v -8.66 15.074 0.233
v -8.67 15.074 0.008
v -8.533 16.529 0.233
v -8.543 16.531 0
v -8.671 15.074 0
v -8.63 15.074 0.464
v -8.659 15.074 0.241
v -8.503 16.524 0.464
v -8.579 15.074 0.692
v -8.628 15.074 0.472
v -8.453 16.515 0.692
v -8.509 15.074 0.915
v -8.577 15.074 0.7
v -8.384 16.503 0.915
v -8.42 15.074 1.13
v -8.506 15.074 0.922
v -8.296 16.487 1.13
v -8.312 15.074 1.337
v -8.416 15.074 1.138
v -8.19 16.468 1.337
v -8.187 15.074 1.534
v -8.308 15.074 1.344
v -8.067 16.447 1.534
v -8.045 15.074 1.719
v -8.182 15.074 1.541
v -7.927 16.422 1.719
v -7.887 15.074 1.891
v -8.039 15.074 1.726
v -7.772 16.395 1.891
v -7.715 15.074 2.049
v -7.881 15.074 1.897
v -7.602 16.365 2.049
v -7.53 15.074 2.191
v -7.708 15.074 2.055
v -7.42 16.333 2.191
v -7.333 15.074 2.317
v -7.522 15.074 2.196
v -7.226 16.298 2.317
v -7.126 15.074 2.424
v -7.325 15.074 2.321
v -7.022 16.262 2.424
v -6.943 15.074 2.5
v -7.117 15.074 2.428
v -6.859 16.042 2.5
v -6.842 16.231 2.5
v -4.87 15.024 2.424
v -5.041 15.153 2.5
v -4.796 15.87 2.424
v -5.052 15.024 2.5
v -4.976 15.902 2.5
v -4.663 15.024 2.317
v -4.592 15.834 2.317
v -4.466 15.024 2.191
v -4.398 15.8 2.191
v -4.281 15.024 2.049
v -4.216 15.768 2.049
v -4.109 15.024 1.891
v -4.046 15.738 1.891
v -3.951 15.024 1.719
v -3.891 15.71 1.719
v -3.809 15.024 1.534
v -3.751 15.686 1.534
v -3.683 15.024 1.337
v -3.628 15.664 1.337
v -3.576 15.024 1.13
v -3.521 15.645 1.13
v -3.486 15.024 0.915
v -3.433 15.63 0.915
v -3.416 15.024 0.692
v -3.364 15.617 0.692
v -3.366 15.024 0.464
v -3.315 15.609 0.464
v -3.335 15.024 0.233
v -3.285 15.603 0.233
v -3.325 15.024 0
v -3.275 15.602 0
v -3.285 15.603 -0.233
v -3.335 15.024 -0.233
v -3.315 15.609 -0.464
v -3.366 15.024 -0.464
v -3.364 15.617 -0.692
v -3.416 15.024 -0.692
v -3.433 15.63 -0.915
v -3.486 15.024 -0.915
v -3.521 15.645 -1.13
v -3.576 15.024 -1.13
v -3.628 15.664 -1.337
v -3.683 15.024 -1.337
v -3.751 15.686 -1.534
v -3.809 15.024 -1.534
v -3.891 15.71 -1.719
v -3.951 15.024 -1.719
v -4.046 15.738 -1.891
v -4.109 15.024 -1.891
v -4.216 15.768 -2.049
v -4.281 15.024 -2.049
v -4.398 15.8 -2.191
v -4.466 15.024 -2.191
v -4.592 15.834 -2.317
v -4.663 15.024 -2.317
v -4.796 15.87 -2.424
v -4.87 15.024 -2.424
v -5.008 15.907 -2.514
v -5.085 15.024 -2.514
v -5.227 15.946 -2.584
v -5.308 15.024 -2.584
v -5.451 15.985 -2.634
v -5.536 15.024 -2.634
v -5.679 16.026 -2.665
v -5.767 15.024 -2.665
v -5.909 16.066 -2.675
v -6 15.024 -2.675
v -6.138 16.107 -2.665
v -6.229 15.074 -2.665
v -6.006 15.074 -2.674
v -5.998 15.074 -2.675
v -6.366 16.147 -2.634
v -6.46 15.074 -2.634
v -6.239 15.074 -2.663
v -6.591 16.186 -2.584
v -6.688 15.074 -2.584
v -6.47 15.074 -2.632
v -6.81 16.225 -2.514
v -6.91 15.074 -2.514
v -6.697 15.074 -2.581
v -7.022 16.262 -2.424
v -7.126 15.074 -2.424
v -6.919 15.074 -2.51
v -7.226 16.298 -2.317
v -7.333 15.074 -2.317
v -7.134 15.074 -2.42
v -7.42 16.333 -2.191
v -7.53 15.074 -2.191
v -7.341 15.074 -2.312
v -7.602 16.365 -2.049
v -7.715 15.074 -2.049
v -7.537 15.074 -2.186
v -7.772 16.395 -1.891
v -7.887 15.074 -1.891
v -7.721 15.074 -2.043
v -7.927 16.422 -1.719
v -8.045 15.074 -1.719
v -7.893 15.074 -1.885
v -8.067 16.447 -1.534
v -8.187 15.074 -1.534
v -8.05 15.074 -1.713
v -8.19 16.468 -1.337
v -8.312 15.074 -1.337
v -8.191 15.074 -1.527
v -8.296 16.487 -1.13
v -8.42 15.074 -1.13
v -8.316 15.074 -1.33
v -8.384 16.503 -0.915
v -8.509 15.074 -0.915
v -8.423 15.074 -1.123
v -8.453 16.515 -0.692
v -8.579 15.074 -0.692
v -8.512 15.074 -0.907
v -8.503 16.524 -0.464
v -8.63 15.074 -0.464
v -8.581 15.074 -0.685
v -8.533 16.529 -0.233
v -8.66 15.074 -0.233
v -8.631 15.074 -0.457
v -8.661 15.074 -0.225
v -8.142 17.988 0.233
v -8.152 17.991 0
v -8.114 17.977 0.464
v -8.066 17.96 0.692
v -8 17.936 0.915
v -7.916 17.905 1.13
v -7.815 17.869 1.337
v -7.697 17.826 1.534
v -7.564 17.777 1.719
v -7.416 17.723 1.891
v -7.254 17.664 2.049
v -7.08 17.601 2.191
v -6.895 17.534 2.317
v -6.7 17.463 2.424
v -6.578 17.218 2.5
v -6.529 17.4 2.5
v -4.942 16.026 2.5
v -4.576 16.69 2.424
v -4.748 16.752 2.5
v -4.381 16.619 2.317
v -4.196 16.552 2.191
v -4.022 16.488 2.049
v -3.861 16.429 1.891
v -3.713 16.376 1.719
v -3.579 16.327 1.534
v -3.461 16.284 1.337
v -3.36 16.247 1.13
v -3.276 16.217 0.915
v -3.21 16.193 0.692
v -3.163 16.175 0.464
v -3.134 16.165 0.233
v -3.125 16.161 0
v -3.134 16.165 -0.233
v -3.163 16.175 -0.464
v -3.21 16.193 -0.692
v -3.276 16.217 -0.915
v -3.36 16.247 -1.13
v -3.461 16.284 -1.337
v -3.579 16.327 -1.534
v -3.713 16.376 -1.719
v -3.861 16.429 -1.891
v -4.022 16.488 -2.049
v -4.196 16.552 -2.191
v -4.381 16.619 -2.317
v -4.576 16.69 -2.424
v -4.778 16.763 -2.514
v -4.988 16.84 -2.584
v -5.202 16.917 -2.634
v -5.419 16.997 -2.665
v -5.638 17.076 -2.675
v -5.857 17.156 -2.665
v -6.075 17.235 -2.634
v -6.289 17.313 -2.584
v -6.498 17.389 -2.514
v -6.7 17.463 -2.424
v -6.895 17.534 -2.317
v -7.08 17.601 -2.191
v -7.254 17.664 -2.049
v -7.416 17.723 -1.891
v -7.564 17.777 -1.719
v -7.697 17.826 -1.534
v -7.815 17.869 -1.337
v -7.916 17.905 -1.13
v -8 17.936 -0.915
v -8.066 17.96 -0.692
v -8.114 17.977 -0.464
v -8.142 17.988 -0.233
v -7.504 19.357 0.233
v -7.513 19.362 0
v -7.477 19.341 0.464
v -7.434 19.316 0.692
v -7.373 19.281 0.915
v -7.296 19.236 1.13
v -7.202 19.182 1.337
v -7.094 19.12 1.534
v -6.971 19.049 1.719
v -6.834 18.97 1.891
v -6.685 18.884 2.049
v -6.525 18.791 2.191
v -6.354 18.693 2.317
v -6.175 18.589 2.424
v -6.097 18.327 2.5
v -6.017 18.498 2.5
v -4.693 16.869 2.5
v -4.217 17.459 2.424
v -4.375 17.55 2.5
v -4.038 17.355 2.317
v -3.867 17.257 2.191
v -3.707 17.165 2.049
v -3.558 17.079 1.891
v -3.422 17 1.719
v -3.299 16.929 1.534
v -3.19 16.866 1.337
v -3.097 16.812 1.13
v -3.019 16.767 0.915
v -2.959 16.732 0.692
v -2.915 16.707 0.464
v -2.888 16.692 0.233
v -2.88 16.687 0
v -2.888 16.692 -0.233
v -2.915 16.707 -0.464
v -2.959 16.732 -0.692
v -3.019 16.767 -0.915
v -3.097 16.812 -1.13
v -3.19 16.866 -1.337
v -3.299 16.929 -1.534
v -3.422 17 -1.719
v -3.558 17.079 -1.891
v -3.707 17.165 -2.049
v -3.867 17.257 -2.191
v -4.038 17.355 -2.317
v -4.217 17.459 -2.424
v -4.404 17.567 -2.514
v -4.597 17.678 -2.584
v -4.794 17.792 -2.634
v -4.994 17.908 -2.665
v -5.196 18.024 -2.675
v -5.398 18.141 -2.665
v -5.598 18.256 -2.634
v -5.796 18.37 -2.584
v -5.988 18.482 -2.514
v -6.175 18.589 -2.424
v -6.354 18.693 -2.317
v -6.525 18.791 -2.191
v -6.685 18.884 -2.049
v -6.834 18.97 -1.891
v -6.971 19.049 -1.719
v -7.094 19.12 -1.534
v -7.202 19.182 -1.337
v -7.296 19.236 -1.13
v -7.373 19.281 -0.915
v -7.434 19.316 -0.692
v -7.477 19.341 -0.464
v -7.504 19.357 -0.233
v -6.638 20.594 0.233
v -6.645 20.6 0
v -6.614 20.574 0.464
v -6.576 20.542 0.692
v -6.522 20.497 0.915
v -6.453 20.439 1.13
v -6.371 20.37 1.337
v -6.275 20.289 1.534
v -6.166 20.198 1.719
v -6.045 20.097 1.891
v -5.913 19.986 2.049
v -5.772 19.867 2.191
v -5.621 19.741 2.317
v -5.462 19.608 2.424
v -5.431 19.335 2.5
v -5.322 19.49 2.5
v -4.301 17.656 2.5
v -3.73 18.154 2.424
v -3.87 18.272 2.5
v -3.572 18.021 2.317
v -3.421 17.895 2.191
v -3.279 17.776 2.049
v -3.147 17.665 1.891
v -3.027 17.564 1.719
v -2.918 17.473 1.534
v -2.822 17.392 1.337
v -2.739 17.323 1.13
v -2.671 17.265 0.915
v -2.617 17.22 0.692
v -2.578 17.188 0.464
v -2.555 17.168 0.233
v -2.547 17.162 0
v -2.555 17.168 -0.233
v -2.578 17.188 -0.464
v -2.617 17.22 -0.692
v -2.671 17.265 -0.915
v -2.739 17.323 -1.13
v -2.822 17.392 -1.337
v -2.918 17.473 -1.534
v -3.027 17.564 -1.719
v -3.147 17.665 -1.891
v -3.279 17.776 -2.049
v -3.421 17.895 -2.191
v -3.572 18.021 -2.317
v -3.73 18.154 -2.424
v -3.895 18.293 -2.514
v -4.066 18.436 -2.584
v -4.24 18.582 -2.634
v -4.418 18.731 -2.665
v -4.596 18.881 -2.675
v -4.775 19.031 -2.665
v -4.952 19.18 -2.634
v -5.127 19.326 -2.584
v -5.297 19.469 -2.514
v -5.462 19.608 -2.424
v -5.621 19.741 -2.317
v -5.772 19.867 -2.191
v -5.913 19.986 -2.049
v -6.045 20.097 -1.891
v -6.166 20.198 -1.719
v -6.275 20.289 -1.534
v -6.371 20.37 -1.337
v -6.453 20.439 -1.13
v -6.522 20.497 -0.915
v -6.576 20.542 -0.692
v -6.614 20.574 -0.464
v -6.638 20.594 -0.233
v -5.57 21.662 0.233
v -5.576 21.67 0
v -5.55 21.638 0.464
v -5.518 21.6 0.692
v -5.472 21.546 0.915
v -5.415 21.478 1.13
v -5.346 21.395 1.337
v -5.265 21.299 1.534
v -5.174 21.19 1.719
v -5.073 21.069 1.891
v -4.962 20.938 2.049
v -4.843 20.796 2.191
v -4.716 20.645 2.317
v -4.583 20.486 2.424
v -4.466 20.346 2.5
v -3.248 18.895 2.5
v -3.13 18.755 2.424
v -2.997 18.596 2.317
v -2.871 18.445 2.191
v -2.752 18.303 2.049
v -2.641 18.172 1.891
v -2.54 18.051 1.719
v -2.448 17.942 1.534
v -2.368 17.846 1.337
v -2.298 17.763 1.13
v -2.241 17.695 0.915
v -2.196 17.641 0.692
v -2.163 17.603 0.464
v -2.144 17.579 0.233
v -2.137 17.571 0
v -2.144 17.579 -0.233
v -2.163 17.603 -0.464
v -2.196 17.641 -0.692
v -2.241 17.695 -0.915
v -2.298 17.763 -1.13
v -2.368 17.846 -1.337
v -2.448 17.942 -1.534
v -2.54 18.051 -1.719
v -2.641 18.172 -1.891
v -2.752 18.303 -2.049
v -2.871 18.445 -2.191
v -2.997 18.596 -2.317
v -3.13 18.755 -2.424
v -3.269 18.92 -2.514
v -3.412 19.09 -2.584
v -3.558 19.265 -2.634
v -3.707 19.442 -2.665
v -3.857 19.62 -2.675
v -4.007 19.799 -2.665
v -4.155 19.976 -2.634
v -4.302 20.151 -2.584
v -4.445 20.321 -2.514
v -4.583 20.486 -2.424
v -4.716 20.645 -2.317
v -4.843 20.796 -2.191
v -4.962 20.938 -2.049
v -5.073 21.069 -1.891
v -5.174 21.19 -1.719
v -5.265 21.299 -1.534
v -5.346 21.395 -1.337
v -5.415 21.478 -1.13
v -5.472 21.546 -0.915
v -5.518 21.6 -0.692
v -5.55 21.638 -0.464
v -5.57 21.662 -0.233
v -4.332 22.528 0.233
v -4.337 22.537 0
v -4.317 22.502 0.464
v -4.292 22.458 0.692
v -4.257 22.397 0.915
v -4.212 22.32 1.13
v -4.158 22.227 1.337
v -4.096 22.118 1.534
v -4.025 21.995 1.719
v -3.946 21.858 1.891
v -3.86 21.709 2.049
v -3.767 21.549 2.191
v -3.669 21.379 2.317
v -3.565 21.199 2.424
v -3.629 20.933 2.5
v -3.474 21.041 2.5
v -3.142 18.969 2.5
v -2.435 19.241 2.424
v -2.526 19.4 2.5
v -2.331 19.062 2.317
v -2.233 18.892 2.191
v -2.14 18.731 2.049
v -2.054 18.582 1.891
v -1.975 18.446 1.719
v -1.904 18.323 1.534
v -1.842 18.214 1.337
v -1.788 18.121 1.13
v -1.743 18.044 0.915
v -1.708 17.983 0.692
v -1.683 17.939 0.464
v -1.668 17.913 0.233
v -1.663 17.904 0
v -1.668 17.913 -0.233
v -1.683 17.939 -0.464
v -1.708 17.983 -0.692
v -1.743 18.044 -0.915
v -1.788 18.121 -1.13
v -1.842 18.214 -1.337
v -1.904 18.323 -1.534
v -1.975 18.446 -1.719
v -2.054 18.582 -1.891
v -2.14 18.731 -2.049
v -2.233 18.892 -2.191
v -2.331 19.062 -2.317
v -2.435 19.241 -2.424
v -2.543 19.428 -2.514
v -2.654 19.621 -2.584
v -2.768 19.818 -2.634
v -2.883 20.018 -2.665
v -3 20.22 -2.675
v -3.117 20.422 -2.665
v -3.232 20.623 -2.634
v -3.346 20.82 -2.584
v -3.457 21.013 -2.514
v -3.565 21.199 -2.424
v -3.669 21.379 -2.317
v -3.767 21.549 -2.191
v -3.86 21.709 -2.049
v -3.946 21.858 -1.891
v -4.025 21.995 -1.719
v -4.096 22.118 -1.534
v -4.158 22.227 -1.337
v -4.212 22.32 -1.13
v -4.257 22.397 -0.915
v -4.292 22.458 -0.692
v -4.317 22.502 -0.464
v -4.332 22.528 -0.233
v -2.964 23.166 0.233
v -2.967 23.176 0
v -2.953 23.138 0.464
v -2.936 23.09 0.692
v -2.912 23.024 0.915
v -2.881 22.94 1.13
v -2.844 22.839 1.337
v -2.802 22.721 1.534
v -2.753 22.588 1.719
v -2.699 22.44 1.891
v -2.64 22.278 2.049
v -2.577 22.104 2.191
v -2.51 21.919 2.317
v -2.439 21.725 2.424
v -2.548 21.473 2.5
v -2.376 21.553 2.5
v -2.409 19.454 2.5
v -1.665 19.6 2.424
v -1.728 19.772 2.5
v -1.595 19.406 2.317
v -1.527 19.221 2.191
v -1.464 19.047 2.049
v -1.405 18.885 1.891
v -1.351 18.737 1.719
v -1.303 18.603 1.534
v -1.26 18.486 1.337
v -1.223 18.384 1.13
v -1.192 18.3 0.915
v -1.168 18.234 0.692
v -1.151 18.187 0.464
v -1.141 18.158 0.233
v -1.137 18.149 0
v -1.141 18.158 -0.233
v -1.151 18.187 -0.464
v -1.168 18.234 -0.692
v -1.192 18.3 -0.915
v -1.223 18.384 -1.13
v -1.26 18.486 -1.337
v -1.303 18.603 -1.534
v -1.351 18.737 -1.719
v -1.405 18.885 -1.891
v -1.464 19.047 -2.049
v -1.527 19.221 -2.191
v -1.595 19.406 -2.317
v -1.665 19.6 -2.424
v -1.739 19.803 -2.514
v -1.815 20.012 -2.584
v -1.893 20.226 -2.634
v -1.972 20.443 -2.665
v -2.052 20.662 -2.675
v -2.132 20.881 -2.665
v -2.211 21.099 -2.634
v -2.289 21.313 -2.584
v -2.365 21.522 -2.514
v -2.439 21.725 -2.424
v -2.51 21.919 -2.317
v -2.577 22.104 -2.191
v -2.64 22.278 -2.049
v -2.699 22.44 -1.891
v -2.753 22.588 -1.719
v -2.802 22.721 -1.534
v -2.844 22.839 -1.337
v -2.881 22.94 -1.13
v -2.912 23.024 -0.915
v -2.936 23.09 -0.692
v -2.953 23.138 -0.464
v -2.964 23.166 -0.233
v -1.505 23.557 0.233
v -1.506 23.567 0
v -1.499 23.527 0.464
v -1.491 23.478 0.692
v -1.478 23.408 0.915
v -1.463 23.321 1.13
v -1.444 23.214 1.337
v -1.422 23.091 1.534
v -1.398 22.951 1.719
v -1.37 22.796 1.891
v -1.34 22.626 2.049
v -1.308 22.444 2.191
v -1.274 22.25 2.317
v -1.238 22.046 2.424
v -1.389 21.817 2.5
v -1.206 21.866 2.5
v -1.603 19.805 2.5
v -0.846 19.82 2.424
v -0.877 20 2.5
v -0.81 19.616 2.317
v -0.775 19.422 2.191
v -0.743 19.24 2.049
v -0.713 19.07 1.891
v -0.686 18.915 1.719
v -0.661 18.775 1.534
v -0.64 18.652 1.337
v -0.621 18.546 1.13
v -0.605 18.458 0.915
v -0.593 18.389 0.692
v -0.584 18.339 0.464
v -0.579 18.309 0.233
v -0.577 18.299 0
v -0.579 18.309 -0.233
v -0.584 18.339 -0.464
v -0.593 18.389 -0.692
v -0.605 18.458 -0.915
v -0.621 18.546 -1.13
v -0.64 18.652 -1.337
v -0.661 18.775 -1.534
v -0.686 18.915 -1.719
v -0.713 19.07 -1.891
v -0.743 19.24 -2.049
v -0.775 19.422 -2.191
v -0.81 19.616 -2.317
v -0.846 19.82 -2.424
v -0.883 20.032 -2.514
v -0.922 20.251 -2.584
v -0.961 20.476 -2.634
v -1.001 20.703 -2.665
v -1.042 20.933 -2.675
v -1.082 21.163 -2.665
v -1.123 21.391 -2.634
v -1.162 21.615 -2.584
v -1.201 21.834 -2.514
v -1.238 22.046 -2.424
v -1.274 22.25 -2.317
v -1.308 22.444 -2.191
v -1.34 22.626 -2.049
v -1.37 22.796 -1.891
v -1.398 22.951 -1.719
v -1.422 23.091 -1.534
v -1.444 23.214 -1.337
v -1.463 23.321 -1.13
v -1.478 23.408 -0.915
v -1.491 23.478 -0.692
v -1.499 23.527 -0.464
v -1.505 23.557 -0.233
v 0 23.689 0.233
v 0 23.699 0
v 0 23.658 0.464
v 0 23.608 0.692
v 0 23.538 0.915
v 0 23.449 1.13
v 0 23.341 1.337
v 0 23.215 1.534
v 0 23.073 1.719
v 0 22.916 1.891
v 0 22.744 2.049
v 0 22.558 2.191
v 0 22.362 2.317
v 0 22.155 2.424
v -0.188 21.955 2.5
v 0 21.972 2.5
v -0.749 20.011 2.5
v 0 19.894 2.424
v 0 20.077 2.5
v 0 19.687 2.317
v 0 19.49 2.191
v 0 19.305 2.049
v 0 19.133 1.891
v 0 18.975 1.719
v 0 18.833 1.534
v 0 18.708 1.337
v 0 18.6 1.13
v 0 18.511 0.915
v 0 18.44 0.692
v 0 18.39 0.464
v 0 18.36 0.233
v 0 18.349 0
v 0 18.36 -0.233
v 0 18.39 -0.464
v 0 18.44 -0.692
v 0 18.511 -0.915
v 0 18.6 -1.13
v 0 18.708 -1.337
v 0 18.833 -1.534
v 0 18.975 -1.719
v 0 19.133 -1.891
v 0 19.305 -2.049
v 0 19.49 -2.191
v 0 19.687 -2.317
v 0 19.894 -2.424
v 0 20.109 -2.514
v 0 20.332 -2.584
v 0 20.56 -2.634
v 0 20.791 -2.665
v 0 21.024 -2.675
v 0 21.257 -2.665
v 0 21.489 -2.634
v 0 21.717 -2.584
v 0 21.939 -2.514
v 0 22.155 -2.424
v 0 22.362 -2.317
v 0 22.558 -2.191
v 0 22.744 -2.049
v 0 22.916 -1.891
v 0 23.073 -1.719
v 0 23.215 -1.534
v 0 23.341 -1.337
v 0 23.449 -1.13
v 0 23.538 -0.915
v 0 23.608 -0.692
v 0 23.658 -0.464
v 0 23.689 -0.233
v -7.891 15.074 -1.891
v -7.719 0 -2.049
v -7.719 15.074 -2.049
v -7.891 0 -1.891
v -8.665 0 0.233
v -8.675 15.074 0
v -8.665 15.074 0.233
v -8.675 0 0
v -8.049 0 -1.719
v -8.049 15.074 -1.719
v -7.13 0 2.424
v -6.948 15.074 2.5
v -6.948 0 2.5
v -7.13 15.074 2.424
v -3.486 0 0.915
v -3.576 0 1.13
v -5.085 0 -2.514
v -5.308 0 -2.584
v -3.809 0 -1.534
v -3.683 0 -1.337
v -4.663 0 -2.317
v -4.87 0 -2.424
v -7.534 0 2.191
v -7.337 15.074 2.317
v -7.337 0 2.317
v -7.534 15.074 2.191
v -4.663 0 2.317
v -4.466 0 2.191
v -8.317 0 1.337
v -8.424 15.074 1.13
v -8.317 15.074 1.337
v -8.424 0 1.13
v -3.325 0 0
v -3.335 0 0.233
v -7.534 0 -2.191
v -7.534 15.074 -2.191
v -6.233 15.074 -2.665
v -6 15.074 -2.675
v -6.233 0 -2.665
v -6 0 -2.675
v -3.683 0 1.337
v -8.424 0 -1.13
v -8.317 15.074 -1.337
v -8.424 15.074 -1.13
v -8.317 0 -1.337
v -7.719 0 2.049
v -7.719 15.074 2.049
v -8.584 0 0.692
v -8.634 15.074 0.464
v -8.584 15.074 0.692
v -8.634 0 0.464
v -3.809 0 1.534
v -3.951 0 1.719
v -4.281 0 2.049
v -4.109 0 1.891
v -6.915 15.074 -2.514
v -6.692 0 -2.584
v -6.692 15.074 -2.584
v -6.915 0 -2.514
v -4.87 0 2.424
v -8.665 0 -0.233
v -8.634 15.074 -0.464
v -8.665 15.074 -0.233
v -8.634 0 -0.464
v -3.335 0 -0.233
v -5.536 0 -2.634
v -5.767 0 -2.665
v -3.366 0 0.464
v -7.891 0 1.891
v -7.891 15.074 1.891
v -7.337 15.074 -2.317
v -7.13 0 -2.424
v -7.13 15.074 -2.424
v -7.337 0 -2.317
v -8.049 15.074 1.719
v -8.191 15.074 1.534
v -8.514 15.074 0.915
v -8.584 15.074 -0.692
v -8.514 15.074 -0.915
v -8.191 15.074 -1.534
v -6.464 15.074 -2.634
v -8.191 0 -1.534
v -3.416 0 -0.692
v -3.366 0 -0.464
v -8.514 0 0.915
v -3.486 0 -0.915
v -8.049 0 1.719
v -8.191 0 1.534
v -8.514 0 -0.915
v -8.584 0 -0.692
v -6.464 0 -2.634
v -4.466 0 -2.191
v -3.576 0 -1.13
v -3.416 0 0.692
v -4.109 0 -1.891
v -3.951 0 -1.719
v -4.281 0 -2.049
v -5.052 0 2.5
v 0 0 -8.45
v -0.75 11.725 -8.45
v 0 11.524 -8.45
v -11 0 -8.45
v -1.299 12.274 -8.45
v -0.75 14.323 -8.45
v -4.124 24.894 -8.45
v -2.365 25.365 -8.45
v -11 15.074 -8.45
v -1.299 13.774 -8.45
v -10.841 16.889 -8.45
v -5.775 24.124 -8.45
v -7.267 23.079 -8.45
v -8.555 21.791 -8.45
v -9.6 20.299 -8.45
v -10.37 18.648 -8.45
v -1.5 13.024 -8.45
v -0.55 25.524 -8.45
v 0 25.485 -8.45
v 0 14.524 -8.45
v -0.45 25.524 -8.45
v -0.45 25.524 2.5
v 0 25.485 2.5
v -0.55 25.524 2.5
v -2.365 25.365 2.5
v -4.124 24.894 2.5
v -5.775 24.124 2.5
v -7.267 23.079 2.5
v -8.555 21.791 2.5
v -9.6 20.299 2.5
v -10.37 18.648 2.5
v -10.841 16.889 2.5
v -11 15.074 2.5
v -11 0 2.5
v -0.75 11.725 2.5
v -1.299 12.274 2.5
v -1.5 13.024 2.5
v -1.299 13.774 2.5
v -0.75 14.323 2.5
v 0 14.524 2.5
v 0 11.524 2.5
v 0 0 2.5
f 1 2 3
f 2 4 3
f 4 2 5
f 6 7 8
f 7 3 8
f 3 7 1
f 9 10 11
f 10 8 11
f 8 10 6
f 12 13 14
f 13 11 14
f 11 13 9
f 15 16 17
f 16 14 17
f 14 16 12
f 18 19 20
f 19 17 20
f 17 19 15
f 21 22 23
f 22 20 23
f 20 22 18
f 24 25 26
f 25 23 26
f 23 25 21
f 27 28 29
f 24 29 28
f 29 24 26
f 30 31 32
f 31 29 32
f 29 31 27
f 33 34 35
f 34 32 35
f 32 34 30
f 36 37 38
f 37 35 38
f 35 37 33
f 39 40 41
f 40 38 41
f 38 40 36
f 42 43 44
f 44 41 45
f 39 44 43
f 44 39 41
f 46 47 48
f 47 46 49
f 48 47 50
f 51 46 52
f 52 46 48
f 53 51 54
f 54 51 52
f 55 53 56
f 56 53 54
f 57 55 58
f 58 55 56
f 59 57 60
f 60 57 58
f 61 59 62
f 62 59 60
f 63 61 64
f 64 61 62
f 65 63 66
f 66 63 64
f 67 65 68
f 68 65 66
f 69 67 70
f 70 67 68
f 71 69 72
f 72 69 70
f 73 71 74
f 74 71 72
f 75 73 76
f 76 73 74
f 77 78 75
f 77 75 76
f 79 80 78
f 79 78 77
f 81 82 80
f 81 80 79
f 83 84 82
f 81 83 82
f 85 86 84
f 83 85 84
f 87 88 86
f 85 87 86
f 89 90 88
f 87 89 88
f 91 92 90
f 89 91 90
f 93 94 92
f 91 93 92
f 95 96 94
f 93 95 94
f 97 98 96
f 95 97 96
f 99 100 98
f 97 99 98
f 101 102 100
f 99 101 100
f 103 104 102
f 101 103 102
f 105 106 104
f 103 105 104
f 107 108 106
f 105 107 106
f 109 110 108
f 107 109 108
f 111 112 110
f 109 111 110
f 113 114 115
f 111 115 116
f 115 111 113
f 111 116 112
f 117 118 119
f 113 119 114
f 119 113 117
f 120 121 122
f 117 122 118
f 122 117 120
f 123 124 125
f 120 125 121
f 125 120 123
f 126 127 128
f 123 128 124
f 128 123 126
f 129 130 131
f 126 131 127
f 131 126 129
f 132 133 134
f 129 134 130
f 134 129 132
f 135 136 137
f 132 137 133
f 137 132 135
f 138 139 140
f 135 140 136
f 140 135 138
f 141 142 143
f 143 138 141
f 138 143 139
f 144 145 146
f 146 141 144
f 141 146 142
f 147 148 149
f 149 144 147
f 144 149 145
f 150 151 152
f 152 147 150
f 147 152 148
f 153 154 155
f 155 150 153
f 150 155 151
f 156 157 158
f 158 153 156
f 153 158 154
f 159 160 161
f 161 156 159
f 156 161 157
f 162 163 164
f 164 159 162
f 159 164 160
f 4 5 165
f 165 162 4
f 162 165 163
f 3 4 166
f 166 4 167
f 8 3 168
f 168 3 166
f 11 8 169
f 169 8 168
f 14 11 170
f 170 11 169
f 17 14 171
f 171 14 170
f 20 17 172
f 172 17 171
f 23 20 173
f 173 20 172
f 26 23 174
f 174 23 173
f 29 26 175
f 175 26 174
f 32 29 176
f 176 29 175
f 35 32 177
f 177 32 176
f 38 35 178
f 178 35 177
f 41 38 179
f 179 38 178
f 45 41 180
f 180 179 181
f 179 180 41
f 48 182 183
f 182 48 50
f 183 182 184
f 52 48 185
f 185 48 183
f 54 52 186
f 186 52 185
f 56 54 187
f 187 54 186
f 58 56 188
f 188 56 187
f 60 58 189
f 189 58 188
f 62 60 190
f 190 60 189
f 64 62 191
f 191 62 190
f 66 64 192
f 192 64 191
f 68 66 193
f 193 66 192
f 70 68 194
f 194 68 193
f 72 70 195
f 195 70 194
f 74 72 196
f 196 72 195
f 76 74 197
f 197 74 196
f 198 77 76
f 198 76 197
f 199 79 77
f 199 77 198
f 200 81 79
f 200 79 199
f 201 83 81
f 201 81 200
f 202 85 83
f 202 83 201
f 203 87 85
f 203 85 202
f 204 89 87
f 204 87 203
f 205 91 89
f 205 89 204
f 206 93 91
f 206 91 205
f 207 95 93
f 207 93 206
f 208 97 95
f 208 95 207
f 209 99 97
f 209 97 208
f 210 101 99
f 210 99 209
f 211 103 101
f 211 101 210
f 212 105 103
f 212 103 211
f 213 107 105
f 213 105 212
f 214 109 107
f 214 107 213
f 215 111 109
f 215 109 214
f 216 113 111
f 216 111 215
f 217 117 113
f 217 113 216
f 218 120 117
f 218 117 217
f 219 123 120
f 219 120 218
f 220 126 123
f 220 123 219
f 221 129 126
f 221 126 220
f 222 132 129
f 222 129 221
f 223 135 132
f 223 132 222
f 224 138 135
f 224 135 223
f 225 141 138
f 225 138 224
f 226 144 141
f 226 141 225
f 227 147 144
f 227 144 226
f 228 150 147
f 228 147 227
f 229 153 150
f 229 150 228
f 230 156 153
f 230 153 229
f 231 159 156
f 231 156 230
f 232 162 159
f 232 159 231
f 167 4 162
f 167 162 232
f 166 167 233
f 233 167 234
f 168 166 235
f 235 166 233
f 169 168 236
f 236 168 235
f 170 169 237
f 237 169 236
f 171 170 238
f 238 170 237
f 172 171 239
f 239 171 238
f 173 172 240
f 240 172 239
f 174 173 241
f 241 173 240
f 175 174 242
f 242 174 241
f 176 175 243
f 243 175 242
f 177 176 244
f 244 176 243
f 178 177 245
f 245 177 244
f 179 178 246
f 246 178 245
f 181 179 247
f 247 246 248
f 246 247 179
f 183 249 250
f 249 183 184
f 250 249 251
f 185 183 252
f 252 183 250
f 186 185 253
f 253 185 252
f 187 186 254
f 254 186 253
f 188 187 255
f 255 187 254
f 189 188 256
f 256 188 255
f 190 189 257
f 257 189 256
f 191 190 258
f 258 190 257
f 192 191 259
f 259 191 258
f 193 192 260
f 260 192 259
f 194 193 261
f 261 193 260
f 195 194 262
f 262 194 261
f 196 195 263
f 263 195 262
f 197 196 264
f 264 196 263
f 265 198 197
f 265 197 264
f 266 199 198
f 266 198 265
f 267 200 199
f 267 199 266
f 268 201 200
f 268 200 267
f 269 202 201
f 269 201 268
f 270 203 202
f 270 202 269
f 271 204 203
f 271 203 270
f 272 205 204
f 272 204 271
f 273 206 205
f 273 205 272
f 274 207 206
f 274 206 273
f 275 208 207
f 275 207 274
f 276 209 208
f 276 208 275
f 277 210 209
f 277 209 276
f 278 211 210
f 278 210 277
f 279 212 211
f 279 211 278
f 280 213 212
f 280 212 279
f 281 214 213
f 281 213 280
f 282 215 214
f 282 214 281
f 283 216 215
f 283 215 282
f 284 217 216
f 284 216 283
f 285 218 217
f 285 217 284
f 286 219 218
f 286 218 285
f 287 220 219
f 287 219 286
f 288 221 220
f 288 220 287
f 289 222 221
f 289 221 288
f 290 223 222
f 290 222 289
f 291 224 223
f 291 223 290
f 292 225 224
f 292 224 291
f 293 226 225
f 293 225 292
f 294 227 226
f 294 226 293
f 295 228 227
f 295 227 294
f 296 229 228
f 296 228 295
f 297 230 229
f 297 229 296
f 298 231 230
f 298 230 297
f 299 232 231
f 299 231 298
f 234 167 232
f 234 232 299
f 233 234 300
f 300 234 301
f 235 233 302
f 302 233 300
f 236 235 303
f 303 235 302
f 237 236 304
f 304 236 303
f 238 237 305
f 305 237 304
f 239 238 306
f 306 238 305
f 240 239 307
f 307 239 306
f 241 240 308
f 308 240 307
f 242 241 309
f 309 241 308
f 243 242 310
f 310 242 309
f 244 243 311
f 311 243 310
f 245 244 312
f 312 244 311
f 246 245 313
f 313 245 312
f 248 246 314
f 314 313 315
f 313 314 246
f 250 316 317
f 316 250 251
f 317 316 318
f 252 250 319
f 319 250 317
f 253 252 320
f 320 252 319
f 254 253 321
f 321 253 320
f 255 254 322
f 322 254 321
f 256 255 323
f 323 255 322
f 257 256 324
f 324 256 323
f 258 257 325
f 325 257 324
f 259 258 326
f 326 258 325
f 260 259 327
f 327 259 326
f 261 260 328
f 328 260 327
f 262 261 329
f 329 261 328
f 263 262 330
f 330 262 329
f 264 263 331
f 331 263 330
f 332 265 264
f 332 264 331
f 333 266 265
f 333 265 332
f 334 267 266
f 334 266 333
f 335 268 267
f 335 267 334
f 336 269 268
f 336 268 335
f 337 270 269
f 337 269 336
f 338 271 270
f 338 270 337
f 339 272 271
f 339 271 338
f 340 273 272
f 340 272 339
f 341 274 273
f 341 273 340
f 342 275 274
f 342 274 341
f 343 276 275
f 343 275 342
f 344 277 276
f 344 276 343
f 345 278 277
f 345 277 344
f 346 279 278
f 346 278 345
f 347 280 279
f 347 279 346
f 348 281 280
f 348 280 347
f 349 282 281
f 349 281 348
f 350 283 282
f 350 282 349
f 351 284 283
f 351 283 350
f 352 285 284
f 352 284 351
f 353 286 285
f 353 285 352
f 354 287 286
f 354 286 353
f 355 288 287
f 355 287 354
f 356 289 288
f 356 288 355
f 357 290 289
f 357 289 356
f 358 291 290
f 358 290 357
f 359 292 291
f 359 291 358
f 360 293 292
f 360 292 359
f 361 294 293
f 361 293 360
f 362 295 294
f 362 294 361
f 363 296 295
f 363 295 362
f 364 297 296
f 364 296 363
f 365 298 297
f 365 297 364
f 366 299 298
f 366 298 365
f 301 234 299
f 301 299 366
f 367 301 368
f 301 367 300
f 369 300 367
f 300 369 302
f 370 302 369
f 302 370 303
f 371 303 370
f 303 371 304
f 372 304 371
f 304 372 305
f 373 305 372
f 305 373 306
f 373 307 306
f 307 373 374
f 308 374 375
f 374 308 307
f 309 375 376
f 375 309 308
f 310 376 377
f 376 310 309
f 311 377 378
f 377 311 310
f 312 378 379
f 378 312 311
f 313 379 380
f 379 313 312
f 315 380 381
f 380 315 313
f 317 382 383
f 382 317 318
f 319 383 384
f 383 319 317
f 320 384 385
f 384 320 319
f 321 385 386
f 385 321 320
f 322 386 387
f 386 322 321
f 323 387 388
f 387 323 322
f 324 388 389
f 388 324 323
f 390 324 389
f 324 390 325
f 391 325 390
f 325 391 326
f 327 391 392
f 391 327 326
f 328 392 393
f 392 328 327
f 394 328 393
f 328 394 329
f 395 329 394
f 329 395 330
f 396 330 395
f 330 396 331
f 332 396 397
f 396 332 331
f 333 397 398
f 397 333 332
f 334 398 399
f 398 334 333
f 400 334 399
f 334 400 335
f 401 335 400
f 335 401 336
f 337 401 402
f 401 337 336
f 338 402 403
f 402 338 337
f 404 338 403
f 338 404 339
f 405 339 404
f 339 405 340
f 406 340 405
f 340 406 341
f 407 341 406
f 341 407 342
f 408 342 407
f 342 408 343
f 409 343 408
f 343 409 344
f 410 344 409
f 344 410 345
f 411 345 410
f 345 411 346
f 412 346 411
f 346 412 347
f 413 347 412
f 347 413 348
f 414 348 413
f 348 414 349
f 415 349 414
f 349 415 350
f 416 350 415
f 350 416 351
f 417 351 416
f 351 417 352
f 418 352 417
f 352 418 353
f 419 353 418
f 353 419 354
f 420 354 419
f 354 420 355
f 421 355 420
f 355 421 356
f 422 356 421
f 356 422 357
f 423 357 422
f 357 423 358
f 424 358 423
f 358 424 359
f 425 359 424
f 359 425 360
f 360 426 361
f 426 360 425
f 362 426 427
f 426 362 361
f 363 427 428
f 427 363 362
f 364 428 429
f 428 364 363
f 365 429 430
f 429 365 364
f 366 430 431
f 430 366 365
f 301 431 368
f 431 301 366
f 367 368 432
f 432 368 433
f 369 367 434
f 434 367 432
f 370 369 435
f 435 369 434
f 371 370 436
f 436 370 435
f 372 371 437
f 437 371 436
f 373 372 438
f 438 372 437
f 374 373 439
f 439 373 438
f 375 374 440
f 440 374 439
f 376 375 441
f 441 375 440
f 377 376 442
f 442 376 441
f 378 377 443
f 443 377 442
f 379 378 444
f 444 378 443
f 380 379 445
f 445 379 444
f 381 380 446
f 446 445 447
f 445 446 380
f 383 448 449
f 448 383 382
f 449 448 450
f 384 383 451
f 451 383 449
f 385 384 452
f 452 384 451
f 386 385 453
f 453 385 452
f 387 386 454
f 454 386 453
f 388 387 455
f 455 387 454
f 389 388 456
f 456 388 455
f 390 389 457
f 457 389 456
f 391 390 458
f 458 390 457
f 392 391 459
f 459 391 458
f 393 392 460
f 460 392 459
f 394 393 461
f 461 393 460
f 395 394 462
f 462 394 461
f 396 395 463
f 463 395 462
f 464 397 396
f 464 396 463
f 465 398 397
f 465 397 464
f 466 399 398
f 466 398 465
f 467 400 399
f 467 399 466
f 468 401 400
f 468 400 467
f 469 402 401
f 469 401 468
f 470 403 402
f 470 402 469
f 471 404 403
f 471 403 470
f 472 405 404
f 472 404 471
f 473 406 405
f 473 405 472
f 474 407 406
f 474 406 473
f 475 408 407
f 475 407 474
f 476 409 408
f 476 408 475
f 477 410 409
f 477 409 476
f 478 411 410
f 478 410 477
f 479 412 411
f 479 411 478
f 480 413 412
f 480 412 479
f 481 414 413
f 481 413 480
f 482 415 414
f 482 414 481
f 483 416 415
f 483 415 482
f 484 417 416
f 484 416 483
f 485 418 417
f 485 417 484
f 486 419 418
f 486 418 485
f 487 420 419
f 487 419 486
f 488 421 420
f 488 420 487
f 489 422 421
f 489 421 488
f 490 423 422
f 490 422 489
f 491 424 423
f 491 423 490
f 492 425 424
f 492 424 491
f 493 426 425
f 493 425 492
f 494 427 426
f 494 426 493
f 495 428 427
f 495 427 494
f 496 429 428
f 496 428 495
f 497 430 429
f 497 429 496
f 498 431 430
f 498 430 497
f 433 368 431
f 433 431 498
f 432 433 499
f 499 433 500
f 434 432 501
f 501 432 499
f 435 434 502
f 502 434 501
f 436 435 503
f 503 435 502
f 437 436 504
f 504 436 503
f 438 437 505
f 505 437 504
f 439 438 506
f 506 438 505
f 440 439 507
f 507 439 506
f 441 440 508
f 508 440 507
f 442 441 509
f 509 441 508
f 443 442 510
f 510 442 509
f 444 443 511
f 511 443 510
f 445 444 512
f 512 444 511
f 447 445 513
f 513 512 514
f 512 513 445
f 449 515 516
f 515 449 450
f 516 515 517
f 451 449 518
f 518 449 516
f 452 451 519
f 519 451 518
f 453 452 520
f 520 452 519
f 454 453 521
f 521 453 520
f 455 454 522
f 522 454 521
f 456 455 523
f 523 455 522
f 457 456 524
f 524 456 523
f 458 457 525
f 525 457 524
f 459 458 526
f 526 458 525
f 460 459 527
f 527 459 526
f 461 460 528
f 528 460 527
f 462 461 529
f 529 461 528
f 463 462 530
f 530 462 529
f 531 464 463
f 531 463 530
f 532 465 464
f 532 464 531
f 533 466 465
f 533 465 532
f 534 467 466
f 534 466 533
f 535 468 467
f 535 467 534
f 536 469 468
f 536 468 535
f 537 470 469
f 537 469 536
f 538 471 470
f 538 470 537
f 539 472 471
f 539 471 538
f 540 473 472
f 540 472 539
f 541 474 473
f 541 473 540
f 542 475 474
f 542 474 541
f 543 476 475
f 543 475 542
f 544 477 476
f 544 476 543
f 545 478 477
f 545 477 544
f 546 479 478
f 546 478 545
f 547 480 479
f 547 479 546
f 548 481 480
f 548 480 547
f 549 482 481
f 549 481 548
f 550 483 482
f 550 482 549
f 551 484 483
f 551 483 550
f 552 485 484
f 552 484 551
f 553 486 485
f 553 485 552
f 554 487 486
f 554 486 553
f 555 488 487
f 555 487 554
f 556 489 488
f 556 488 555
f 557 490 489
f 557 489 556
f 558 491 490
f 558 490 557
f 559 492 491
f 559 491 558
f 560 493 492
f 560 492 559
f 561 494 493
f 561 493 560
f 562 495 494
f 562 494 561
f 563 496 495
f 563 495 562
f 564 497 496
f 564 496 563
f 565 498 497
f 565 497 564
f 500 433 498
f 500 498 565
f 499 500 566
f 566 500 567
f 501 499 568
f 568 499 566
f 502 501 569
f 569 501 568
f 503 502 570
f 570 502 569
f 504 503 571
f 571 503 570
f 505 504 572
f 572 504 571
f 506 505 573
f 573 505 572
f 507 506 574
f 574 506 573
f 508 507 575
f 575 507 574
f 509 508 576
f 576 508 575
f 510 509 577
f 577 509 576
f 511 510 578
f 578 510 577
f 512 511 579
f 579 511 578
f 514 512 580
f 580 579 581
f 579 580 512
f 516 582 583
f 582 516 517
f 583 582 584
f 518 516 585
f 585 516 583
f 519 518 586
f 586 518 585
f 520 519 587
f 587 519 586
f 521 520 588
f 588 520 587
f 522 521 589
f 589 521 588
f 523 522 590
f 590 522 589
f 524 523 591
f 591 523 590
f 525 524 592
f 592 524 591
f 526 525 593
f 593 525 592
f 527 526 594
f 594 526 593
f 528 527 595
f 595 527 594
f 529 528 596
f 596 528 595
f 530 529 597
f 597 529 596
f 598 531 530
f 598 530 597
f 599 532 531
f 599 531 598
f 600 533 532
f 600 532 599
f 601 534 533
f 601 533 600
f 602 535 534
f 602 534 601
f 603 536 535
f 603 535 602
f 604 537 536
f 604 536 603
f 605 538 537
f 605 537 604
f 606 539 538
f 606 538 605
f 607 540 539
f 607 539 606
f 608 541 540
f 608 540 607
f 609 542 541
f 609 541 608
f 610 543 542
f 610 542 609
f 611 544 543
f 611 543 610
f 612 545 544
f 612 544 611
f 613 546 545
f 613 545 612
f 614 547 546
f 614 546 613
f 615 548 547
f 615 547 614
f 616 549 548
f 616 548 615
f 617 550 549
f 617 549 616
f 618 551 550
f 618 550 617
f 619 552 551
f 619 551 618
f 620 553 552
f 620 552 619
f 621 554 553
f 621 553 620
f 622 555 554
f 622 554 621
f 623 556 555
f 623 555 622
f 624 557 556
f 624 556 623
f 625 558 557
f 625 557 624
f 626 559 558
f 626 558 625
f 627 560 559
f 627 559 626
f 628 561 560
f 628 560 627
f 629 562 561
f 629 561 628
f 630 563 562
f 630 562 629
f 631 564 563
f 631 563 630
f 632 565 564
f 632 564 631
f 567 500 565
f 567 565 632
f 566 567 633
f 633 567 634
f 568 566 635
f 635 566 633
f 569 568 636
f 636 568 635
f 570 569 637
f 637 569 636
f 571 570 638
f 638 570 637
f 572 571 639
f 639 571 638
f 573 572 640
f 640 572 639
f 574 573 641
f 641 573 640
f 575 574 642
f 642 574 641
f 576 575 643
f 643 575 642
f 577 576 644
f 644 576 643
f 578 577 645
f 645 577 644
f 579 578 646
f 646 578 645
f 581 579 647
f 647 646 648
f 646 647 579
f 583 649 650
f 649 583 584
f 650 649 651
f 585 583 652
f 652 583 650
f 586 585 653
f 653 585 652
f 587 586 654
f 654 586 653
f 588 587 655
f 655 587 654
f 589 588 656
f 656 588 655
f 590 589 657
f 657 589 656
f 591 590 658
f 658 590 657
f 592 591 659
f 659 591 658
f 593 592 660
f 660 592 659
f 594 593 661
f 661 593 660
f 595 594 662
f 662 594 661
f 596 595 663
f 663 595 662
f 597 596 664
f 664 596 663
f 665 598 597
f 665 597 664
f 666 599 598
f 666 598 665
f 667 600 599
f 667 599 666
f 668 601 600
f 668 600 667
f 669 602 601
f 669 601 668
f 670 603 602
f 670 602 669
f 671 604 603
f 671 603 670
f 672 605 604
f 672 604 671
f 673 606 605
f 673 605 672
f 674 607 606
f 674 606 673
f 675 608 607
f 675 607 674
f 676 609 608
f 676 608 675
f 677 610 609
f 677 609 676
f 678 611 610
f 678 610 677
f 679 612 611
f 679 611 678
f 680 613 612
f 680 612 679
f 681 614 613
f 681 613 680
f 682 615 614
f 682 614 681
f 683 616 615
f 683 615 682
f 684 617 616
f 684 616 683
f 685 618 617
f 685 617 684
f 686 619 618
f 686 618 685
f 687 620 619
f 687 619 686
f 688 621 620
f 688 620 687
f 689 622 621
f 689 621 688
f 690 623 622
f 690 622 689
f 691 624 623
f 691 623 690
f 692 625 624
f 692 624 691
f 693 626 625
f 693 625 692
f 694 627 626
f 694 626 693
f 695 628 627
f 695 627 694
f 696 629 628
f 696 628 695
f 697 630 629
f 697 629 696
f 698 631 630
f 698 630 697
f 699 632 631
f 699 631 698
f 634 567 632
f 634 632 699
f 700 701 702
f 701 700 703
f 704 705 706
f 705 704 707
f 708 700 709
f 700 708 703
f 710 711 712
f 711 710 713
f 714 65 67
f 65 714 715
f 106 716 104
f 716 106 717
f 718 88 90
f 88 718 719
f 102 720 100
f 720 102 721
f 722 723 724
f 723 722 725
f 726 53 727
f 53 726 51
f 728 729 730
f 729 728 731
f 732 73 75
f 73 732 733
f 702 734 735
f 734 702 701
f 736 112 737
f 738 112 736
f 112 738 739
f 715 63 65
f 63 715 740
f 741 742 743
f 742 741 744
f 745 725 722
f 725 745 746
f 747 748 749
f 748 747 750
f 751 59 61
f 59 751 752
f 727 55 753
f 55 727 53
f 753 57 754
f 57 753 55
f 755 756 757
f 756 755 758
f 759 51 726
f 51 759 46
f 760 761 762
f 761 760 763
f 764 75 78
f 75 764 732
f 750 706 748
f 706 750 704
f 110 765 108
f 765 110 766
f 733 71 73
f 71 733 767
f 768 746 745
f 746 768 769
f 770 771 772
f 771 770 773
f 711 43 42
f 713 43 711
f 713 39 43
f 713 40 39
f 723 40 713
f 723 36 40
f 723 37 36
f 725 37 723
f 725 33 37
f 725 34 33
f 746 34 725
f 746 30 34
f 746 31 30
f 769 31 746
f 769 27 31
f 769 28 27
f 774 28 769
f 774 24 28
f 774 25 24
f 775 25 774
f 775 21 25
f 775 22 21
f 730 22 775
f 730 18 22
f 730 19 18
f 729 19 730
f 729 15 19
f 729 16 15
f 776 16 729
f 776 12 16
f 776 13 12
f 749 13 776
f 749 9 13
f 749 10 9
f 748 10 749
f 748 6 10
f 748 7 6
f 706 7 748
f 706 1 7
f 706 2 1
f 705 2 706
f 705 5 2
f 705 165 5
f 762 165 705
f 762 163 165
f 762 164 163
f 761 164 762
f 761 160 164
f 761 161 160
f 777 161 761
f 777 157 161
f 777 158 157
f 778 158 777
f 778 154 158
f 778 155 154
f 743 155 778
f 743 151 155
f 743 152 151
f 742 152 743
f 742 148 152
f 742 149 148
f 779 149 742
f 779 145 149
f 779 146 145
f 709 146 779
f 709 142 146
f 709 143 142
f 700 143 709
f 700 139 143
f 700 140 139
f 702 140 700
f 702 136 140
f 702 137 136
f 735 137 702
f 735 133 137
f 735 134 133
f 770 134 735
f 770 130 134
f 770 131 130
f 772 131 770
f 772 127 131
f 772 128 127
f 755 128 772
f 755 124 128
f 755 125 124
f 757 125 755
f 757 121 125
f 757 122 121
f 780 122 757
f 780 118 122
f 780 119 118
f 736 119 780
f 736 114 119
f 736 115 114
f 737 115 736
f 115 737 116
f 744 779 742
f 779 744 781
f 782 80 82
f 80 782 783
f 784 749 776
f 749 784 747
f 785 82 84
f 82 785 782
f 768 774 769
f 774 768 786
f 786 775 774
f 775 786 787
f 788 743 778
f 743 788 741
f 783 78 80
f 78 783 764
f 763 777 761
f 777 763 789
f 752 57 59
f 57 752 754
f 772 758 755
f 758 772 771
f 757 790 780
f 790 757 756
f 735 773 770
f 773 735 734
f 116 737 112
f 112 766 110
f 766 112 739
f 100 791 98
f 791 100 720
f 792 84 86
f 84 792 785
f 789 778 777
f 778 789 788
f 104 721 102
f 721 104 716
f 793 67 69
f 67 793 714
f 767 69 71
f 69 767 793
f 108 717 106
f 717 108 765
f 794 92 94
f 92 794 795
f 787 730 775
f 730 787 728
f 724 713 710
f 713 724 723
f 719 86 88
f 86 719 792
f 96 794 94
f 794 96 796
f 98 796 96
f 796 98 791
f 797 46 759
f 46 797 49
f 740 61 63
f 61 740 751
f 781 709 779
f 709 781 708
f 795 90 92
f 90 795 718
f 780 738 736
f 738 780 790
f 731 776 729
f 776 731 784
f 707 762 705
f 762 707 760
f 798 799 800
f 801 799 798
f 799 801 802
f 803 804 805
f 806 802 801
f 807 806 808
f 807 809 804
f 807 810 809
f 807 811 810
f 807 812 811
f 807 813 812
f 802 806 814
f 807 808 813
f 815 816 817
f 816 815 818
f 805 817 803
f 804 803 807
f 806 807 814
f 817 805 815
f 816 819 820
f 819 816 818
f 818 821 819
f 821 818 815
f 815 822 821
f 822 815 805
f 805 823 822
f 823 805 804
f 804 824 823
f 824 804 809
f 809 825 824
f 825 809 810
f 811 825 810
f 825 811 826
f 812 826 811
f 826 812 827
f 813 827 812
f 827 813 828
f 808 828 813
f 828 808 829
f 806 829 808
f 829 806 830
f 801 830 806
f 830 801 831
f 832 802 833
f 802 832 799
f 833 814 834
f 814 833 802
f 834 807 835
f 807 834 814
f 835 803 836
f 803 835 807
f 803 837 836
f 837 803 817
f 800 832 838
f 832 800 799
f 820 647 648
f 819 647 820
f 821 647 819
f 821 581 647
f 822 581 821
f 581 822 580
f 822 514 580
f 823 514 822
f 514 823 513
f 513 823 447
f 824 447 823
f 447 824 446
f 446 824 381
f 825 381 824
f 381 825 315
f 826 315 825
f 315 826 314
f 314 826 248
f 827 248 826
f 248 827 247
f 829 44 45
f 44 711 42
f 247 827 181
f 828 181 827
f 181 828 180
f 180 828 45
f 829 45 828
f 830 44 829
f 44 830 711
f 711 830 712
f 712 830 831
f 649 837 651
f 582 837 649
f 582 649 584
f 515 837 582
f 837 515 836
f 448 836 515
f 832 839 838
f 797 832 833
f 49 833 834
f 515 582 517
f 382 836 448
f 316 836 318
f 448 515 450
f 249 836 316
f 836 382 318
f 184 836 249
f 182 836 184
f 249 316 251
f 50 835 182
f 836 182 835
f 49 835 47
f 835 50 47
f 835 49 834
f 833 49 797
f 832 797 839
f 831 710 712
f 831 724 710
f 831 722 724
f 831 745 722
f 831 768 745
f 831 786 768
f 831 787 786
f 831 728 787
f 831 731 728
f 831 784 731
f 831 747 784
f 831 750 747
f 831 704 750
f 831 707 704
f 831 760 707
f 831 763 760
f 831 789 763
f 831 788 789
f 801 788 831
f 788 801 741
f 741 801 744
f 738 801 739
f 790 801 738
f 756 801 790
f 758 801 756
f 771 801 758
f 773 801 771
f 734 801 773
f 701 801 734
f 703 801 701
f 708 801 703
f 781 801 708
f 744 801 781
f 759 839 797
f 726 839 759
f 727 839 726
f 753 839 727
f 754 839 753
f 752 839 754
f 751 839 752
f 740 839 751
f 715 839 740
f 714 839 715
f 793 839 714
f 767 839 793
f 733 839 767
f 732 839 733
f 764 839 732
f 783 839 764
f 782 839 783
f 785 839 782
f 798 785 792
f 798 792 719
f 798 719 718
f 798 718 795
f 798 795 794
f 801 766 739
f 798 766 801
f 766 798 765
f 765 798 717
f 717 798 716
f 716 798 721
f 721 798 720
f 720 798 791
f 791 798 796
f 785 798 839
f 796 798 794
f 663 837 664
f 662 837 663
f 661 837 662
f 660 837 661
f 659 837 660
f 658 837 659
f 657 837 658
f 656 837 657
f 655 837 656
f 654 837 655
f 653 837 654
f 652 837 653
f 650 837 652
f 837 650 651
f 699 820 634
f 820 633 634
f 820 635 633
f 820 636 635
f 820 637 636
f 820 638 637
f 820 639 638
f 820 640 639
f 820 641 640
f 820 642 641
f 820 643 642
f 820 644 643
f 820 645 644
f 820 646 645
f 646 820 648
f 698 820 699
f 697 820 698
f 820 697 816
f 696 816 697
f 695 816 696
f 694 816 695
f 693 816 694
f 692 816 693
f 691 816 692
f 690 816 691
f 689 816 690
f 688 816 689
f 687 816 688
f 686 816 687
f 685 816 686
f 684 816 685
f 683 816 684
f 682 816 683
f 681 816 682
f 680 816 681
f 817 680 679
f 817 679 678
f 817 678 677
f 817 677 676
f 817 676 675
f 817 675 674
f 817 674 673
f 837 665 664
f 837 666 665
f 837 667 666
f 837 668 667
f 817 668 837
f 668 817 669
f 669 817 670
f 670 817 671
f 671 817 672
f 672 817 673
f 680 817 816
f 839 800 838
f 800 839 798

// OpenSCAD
include <recirculating_mw.scad>
difference() {
    half();
    translate([0, -20, 0]) cube([40, 40, 40], center=true);
    translate([20, 0, 0]) cube([40, 60, 40], center=true);
}

/* translate([29, 0, 0]) rotate([0,0,180]) % half(6);
// extrusion
xwid = 15;
translate([xwid/2, -50, -xwid/2]) 
   % cube([15, 100, 15]);
// carriage plate
translate([15,0,-thickness+slot])
   % recirc_plate(14.5);
 */
